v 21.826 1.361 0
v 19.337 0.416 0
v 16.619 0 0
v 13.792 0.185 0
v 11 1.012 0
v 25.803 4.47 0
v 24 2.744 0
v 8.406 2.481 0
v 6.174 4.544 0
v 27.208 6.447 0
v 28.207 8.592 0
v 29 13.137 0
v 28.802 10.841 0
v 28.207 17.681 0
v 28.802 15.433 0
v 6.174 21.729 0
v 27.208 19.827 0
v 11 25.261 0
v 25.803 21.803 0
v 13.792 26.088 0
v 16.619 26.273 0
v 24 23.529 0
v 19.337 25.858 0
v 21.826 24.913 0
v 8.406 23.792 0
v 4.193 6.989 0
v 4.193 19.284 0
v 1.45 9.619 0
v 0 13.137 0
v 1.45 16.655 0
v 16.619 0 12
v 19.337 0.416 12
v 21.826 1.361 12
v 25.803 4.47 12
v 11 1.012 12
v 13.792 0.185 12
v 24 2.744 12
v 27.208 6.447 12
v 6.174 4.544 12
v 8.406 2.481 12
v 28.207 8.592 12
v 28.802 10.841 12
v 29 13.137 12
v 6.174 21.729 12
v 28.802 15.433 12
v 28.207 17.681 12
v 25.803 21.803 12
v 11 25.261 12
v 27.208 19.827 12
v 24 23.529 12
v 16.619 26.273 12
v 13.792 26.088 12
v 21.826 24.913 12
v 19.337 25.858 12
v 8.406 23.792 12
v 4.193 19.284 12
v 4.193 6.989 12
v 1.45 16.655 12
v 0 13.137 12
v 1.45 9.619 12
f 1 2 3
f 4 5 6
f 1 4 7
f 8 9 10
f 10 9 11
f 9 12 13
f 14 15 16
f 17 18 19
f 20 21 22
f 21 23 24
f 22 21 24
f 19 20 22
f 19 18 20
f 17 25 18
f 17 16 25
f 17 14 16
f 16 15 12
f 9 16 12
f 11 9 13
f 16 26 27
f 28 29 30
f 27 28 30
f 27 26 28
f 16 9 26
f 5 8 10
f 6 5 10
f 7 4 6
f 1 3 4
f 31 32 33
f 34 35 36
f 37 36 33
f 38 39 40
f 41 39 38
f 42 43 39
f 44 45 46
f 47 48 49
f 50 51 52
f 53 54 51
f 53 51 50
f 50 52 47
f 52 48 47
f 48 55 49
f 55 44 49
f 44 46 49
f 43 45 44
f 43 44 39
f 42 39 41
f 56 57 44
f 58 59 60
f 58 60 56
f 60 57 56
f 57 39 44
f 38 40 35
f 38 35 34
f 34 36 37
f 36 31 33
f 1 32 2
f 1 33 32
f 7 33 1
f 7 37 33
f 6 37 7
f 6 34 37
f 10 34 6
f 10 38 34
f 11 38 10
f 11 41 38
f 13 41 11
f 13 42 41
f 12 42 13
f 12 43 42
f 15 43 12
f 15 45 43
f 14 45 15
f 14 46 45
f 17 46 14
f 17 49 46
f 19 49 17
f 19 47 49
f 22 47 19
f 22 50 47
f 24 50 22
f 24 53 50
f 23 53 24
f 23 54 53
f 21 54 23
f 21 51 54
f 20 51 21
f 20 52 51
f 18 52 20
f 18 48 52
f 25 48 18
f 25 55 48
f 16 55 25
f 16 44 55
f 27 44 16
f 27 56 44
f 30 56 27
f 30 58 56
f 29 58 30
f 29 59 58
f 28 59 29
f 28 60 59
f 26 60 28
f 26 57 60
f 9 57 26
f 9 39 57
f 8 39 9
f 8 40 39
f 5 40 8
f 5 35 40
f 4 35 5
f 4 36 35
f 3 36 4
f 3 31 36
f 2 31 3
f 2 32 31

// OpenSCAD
$fn = 32;

// ----------------------------------------------------------------------
// Cam disc: base radius 11.0 mm, lift 4.0 mm, 30 profile points
// ----------------------------------------------------------------------

// --- parameters (mm) ---
profile_height = 12;      // extrusion height
profile_points = 30;      // points of the closed outline

profile = [[29, 13.137], [28.802, 15.433], [28.207, 17.681], [27.208, 19.827], [25.803, 21.803], [24, 23.529], [21.826, 24.913], [19.337, 25.858], [16.619, 26.273], [13.792, 26.088], [11, 25.261], [8.406, 23.792], [6.174, 21.729], [4.193, 19.284], [1.45, 16.655], [0, 13.137], [1.45, 9.619], [4.193, 6.989], [6.174, 4.544], [8.406, 2.481], [11, 1.012], [13.792, 0.185], [16.619, 0], [19.337, 0.416], [21.826, 1.361], [24, 2.744], [25.803, 4.47], [27.208, 6.447], [28.207, 8.592], [28.802, 10.841]];  // single closed polygon, 30 points, counter clockwise

// --- the one profile operation ---
linear_extrude(height = profile_height) polygon(points = profile);
